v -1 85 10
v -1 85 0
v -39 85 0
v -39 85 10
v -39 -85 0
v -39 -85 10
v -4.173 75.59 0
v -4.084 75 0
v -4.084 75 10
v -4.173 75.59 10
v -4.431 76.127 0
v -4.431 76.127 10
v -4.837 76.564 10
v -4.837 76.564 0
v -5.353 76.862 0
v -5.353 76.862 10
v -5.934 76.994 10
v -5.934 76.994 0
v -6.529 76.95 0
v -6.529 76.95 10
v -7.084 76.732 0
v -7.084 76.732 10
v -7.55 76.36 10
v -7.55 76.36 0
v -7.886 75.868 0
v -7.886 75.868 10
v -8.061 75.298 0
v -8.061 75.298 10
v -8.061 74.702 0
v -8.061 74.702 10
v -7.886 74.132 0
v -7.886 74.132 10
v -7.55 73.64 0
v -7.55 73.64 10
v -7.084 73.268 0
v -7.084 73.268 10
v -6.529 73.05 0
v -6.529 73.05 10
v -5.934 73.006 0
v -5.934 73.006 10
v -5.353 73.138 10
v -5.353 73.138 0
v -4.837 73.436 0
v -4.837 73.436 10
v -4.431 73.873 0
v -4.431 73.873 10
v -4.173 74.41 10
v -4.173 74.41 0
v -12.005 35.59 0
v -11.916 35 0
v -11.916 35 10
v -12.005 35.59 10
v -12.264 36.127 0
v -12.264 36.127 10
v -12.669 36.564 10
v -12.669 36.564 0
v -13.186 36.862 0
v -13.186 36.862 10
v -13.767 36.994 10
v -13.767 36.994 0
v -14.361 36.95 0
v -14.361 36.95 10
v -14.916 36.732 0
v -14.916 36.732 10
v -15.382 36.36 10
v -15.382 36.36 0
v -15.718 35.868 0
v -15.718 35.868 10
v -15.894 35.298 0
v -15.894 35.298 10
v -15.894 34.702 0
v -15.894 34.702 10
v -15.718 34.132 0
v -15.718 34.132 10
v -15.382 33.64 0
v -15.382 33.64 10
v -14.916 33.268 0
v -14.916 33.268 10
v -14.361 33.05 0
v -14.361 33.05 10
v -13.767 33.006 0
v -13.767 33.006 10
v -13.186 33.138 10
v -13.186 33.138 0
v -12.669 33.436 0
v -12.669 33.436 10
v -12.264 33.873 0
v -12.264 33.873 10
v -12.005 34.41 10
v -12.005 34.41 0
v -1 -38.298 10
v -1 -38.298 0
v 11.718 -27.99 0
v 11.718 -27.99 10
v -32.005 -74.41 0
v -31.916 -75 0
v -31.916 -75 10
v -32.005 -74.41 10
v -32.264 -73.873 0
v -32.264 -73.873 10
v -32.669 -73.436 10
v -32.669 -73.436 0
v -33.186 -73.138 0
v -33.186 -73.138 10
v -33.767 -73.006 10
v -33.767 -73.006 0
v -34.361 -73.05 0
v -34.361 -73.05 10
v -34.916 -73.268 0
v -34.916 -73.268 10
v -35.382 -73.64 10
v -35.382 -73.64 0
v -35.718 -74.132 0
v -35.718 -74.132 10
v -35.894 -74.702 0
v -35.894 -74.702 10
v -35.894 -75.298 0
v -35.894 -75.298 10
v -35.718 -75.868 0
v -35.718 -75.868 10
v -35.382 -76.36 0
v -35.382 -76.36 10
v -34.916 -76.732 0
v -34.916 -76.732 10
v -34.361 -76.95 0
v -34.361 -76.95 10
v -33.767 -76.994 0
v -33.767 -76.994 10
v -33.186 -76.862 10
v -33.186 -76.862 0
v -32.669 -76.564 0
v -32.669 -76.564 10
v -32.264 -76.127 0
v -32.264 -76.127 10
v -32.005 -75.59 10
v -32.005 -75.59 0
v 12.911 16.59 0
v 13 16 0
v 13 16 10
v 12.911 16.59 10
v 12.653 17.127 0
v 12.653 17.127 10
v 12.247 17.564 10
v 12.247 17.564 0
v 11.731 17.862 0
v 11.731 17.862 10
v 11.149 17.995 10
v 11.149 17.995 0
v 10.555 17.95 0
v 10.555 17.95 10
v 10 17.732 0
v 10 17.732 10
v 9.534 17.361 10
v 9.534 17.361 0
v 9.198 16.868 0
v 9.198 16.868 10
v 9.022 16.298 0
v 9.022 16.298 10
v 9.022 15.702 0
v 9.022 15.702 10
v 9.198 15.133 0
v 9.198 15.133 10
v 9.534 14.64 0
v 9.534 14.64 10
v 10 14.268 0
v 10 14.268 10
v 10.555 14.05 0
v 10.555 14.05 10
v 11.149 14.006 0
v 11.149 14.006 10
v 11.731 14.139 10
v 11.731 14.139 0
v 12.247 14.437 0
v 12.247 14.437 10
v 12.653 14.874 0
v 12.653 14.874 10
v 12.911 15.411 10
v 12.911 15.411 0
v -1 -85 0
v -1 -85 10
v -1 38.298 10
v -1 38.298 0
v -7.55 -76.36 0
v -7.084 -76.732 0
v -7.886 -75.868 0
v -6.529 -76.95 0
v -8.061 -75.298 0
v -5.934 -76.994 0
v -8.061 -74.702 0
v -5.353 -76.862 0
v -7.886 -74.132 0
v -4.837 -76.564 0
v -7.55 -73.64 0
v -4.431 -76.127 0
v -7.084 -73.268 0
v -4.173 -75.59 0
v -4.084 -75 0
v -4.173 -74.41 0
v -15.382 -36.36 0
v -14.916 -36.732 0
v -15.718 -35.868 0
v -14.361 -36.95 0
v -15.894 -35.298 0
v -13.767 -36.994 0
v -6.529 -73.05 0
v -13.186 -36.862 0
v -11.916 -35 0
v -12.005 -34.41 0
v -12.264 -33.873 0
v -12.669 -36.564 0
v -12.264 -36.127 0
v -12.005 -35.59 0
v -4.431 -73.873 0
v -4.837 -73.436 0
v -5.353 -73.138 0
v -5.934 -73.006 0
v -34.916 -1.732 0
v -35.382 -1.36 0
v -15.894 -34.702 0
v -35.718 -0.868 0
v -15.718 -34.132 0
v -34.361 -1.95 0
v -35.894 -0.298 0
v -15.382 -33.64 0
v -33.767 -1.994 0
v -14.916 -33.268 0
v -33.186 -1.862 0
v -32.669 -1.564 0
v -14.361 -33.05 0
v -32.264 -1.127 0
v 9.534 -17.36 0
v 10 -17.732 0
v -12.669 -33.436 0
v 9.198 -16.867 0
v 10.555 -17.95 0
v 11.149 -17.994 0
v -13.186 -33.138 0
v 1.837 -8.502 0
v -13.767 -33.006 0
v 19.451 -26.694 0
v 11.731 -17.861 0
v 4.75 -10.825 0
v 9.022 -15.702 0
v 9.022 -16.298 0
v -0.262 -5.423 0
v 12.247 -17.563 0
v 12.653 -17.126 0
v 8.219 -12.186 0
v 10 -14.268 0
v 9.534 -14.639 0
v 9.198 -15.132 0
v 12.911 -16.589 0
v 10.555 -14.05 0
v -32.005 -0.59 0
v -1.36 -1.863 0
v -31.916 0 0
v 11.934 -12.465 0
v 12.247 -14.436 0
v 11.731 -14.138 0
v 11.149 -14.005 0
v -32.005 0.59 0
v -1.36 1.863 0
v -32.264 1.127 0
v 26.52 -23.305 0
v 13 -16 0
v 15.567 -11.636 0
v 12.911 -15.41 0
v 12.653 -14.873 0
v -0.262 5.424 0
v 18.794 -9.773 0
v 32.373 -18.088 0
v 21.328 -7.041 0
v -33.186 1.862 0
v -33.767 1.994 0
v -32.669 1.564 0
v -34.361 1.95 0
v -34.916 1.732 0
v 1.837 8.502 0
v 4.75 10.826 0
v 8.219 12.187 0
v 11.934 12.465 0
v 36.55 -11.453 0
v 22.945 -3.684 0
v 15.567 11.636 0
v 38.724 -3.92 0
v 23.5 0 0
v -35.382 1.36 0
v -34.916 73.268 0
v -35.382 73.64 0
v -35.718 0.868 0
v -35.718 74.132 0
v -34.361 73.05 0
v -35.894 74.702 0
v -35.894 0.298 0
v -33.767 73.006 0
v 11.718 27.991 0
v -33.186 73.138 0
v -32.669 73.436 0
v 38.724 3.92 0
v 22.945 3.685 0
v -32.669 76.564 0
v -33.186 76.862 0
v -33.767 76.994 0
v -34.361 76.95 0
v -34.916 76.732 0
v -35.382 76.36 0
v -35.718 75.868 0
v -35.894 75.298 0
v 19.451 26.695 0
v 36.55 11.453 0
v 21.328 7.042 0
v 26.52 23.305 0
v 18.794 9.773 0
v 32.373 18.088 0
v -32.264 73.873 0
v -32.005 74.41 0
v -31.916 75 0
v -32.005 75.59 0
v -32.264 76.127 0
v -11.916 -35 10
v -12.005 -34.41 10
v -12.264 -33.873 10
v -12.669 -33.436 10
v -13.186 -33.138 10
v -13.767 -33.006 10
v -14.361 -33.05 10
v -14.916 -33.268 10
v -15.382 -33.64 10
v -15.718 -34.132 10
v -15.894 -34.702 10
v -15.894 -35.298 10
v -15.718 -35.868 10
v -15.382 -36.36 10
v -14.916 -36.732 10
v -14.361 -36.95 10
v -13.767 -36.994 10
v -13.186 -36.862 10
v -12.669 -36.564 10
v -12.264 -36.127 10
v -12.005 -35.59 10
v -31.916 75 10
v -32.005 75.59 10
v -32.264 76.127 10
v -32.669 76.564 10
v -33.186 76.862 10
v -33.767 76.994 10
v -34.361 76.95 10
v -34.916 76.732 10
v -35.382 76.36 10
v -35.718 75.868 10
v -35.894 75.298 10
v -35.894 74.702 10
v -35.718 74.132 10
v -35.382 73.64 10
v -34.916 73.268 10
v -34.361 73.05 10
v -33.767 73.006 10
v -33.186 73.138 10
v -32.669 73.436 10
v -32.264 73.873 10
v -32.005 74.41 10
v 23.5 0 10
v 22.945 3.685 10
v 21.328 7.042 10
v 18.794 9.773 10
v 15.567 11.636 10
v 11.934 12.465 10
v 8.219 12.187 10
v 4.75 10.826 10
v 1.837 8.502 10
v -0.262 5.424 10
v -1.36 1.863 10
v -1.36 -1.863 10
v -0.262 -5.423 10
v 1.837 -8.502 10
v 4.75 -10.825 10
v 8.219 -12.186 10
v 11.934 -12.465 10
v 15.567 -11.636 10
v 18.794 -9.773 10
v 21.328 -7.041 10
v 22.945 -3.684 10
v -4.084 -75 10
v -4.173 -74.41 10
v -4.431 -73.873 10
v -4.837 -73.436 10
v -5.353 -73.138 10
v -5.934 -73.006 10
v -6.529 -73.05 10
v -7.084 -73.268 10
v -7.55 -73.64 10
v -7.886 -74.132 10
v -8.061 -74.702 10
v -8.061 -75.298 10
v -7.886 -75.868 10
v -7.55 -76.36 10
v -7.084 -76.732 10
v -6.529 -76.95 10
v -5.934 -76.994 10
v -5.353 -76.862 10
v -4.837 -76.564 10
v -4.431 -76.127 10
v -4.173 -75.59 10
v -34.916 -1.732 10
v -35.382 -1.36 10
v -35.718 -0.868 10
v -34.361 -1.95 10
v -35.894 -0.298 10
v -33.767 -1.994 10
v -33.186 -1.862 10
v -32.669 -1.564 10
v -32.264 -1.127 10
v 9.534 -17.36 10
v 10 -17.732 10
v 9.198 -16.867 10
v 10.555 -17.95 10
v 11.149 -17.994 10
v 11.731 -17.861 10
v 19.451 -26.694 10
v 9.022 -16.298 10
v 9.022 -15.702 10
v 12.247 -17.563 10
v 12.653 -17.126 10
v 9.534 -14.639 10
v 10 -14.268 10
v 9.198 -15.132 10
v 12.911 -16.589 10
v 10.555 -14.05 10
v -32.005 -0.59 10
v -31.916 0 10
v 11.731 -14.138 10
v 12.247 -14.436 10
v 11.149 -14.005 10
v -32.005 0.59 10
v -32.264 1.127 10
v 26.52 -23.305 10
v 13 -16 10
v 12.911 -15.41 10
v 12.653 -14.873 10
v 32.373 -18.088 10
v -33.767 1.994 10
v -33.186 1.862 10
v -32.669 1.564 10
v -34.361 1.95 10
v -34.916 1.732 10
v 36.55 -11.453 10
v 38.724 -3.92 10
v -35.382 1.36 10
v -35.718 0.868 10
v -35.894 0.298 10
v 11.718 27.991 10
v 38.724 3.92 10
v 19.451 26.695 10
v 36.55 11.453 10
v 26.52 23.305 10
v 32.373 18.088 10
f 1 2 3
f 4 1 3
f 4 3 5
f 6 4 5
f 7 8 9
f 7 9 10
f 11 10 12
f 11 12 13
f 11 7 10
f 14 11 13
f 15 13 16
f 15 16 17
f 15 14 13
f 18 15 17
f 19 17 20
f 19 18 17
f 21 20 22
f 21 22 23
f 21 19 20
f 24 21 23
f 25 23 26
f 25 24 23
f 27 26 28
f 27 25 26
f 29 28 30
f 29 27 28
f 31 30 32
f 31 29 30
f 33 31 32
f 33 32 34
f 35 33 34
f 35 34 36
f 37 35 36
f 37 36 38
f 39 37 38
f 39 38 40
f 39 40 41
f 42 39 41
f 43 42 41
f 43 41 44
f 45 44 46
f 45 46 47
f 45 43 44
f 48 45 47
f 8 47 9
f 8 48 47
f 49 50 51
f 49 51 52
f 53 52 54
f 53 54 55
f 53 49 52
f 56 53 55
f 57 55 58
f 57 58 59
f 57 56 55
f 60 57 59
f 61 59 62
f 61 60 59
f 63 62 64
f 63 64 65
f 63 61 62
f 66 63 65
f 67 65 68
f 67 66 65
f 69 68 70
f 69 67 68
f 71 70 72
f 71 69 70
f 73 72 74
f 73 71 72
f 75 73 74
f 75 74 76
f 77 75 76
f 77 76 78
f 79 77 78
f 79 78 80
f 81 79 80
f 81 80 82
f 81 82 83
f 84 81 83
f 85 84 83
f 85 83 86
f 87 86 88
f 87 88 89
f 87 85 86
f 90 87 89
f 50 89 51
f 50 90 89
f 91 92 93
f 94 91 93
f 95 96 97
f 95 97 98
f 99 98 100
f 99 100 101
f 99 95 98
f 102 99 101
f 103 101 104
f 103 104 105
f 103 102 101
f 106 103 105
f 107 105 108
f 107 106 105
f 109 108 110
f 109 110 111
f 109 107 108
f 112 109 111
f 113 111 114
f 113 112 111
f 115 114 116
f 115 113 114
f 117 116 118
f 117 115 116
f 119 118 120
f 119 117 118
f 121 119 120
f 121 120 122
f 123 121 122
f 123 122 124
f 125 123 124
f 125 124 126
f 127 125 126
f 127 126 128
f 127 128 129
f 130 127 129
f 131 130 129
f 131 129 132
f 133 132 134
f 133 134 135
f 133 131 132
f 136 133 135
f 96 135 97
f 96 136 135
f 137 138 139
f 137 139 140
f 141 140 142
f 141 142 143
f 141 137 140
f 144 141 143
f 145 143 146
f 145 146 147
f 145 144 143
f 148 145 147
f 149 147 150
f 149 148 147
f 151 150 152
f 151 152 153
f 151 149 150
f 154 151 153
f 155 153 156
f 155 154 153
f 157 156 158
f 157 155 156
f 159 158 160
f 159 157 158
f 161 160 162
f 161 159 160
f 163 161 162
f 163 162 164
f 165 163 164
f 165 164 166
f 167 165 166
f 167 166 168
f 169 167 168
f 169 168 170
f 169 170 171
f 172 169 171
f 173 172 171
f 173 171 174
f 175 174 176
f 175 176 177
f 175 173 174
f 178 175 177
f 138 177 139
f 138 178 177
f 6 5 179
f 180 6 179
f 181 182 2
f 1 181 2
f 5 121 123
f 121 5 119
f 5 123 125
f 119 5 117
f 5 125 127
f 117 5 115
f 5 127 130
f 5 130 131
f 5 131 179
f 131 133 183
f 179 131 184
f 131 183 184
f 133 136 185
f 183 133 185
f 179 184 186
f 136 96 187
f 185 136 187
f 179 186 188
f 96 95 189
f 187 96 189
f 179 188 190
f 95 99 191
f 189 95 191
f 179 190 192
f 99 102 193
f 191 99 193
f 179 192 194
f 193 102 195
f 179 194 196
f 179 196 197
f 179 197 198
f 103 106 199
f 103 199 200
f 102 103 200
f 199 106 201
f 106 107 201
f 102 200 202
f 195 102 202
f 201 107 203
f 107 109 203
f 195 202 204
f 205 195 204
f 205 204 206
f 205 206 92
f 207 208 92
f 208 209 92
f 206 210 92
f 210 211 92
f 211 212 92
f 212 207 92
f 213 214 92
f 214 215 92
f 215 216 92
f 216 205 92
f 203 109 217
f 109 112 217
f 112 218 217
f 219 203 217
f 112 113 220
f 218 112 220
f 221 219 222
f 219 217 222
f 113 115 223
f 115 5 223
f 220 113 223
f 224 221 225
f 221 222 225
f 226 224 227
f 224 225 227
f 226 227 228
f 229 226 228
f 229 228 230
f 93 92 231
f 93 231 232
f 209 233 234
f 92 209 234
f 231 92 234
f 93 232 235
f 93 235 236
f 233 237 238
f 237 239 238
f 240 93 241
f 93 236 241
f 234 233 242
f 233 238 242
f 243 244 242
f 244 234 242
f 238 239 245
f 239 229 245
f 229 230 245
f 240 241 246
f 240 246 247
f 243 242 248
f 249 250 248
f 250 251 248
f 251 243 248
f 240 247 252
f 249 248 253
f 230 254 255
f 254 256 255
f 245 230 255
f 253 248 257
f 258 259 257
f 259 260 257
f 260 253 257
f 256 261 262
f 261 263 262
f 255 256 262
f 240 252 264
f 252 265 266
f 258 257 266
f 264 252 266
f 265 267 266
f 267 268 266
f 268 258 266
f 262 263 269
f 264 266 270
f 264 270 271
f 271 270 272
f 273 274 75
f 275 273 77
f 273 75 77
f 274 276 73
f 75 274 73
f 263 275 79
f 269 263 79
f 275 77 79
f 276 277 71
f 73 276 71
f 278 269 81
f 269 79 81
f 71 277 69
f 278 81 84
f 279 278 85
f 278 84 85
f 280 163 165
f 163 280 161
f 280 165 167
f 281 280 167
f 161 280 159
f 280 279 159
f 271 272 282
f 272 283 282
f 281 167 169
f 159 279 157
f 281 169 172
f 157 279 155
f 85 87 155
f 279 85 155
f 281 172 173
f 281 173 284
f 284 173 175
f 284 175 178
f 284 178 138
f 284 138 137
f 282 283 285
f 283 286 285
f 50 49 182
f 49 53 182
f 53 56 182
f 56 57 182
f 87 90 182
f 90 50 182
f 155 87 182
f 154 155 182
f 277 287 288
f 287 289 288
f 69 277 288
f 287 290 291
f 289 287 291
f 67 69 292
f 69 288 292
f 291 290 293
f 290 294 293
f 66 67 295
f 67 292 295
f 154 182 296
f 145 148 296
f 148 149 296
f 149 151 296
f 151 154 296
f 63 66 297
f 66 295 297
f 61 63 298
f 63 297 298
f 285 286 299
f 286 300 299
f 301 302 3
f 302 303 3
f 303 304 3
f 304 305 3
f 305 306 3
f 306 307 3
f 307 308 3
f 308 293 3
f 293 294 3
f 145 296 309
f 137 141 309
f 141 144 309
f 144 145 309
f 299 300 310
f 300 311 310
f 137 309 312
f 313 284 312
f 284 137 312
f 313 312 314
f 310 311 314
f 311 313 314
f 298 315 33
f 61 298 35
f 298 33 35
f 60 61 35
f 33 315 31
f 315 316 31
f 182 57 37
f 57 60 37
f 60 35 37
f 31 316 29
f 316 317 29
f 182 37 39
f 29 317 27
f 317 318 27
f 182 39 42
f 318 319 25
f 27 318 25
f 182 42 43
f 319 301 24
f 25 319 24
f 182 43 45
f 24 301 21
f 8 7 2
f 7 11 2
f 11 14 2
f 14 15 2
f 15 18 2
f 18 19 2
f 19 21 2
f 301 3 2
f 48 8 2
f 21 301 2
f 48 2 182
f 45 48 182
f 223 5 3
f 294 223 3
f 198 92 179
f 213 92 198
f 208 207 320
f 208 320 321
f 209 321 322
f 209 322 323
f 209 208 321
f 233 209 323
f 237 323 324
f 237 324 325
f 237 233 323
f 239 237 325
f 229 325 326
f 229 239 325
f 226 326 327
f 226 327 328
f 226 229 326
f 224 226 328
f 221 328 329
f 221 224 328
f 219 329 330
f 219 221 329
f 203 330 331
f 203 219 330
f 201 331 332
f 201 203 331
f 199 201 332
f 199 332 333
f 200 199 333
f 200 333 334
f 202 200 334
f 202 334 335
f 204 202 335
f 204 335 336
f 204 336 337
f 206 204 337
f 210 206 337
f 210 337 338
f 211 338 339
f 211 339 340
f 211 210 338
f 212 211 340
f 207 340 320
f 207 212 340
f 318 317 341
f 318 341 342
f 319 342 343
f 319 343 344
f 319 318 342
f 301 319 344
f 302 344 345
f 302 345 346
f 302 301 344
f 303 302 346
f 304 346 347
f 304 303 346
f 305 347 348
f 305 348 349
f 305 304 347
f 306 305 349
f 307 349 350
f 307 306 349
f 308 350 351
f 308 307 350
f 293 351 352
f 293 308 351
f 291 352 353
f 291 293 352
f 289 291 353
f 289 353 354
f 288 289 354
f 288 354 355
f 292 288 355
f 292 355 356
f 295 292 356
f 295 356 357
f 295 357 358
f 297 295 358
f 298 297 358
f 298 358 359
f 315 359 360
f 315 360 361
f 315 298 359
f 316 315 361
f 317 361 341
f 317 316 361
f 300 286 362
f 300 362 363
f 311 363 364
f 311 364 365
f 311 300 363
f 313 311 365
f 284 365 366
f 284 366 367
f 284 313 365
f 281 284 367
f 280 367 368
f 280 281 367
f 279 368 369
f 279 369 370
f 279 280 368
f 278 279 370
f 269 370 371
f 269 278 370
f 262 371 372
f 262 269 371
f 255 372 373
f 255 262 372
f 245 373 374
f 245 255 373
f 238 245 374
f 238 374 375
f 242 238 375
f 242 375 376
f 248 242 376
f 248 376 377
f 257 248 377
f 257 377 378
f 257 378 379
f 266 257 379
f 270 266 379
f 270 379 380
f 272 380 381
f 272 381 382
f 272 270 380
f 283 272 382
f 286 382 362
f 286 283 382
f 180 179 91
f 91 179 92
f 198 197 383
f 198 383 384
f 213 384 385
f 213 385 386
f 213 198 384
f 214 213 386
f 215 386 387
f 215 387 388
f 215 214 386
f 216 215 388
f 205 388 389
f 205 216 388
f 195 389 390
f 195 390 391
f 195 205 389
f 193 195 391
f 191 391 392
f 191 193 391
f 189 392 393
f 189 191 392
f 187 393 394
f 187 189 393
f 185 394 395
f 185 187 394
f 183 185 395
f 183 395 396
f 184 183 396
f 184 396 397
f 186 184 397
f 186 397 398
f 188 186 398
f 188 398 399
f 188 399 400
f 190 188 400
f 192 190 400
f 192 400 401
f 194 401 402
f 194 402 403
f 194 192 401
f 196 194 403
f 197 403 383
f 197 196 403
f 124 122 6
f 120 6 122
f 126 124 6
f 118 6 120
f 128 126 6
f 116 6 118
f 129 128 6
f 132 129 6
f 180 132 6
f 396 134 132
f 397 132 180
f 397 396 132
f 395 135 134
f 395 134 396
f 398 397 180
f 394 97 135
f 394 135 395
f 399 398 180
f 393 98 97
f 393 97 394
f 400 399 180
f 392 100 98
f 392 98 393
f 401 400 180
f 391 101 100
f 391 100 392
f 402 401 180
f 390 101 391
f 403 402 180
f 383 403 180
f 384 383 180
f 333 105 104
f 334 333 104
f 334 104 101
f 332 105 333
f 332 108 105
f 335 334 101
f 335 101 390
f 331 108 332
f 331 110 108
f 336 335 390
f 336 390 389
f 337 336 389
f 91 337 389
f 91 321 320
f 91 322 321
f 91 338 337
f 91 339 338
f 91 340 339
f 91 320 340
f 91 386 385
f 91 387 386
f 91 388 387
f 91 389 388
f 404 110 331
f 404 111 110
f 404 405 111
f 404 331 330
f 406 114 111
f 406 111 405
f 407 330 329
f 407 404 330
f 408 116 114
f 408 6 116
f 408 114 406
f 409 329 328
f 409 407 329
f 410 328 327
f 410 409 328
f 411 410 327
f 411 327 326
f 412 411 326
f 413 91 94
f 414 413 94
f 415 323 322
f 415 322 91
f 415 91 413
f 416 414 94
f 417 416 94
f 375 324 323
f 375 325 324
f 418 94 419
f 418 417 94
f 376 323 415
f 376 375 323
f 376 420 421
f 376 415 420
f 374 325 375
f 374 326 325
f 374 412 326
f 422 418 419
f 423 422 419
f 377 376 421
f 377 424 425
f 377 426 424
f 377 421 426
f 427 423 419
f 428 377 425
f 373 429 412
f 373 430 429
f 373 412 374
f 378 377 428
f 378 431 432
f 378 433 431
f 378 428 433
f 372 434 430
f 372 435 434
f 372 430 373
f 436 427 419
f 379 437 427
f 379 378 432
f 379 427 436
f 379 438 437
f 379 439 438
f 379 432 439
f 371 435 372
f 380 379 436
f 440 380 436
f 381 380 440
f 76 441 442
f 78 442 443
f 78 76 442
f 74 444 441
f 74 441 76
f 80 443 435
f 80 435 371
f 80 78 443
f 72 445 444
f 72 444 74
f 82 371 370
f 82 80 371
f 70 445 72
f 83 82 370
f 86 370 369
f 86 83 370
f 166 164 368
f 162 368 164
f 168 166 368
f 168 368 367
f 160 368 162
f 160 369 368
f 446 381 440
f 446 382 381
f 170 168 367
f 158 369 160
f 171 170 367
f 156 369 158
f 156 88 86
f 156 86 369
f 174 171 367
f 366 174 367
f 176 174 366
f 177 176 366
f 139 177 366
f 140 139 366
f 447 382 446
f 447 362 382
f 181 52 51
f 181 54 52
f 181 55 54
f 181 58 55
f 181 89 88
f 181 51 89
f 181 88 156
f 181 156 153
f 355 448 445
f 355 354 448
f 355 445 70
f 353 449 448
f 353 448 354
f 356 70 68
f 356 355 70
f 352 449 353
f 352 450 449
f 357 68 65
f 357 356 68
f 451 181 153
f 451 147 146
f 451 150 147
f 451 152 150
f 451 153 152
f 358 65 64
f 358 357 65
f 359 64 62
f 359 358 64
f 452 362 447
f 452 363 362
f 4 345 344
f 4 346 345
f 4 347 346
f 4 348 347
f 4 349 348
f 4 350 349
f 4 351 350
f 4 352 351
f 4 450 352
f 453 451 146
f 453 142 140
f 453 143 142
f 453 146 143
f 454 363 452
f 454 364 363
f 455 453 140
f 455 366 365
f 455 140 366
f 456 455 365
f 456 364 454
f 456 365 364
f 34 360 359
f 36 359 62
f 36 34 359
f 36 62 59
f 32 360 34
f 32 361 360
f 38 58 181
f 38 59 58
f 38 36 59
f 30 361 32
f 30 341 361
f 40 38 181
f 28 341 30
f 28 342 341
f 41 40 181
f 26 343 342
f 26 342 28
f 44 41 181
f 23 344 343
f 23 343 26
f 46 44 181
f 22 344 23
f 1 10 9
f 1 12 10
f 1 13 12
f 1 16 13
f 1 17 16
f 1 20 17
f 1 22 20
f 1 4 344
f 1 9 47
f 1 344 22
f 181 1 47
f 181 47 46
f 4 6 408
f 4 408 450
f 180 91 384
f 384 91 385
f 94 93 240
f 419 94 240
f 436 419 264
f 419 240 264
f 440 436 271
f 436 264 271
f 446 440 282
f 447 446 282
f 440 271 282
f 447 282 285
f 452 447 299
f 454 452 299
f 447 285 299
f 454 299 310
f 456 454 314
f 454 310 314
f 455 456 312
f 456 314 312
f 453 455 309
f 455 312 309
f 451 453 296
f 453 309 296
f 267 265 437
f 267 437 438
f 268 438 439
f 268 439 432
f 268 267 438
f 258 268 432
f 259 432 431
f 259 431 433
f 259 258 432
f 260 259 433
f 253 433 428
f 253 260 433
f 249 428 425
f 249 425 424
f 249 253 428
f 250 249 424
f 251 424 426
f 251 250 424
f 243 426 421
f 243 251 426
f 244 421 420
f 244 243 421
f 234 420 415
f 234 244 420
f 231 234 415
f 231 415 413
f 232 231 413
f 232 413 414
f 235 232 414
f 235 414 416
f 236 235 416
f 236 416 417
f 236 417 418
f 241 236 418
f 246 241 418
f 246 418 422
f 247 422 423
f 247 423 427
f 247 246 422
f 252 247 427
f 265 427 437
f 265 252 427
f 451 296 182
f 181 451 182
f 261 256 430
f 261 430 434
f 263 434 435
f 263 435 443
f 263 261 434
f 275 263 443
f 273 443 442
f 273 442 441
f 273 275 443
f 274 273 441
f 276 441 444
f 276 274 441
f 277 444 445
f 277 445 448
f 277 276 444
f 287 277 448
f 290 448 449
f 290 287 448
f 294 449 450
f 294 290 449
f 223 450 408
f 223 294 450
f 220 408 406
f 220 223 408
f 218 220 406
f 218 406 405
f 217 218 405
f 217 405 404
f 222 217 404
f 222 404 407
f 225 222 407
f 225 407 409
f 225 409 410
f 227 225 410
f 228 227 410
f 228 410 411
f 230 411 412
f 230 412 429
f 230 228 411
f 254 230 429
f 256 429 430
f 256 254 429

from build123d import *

# Parameters (mm, degrees)
SKETCH1_R           = 2
SKETCH1_R_2         = 12.5
BOSS_EXTRUDE1_DEPTH = 10


with BuildPart() as part:
    # Sketch1 → Boss-Extrude1 (new body)
    with BuildSketch(Plane.XY):
        with BuildLine():
            Line((-1.000028724, -38.297888442), (11.718065373, -27.990486171))
            ThreePointArc((11.718065373, -27.990486171), (39.000028724, 0.00030559), (11.718065373, 27.99109735))
            Line((11.718065373, 27.99109735), (-1.000028724, 38.298499621))
            Line((-1.000028724, 38.298499621), (-1.000028724, 85))
            Line((-1.000028724, 85), (-39.000028724, 85))
            Line((-39.000028724, 85), (-39.000028724, -85))
            Line((-39.000028724, -85), (-1.000028724, -85))
            Line((-1.000028724, -85), (-1.000028724, -38.297888442))
        make_face()
        with Locations((-13.916259829, -35)):
            Circle(SKETCH1_R, mode=Mode.SUBTRACT)
        with Locations((-13.916259829, 35)):
            Circle(SKETCH1_R, mode=Mode.SUBTRACT)
        with Locations((11.000028724, 0.00030559)):
            Circle(SKETCH1_R_2, mode=Mode.SUBTRACT)
        with Locations((-6.083797619, 75)):
            Circle(SKETCH1_R, mode=Mode.SUBTRACT)
        with Locations((-6.083797619, -75)):
            Circle(SKETCH1_R, mode=Mode.SUBTRACT)
        with Locations((-33.916259829, 75)):
            Circle(SKETCH1_R, mode=Mode.SUBTRACT)
        with Locations((-33.916259829, 0)):
            Circle(SKETCH1_R, mode=Mode.SUBTRACT)
        with Locations((11.000028724, -15.99969441)):
            Circle(SKETCH1_R, mode=Mode.SUBTRACT)
        with Locations((11.000028724, 16.00030559)):
            Circle(SKETCH1_R, mode=Mode.SUBTRACT)
        with Locations((-33.916259829, -75)):
            Circle(SKETCH1_R, mode=Mode.SUBTRACT)
    extrude(amount=BOSS_EXTRUDE1_DEPTH)


solid = part.part
